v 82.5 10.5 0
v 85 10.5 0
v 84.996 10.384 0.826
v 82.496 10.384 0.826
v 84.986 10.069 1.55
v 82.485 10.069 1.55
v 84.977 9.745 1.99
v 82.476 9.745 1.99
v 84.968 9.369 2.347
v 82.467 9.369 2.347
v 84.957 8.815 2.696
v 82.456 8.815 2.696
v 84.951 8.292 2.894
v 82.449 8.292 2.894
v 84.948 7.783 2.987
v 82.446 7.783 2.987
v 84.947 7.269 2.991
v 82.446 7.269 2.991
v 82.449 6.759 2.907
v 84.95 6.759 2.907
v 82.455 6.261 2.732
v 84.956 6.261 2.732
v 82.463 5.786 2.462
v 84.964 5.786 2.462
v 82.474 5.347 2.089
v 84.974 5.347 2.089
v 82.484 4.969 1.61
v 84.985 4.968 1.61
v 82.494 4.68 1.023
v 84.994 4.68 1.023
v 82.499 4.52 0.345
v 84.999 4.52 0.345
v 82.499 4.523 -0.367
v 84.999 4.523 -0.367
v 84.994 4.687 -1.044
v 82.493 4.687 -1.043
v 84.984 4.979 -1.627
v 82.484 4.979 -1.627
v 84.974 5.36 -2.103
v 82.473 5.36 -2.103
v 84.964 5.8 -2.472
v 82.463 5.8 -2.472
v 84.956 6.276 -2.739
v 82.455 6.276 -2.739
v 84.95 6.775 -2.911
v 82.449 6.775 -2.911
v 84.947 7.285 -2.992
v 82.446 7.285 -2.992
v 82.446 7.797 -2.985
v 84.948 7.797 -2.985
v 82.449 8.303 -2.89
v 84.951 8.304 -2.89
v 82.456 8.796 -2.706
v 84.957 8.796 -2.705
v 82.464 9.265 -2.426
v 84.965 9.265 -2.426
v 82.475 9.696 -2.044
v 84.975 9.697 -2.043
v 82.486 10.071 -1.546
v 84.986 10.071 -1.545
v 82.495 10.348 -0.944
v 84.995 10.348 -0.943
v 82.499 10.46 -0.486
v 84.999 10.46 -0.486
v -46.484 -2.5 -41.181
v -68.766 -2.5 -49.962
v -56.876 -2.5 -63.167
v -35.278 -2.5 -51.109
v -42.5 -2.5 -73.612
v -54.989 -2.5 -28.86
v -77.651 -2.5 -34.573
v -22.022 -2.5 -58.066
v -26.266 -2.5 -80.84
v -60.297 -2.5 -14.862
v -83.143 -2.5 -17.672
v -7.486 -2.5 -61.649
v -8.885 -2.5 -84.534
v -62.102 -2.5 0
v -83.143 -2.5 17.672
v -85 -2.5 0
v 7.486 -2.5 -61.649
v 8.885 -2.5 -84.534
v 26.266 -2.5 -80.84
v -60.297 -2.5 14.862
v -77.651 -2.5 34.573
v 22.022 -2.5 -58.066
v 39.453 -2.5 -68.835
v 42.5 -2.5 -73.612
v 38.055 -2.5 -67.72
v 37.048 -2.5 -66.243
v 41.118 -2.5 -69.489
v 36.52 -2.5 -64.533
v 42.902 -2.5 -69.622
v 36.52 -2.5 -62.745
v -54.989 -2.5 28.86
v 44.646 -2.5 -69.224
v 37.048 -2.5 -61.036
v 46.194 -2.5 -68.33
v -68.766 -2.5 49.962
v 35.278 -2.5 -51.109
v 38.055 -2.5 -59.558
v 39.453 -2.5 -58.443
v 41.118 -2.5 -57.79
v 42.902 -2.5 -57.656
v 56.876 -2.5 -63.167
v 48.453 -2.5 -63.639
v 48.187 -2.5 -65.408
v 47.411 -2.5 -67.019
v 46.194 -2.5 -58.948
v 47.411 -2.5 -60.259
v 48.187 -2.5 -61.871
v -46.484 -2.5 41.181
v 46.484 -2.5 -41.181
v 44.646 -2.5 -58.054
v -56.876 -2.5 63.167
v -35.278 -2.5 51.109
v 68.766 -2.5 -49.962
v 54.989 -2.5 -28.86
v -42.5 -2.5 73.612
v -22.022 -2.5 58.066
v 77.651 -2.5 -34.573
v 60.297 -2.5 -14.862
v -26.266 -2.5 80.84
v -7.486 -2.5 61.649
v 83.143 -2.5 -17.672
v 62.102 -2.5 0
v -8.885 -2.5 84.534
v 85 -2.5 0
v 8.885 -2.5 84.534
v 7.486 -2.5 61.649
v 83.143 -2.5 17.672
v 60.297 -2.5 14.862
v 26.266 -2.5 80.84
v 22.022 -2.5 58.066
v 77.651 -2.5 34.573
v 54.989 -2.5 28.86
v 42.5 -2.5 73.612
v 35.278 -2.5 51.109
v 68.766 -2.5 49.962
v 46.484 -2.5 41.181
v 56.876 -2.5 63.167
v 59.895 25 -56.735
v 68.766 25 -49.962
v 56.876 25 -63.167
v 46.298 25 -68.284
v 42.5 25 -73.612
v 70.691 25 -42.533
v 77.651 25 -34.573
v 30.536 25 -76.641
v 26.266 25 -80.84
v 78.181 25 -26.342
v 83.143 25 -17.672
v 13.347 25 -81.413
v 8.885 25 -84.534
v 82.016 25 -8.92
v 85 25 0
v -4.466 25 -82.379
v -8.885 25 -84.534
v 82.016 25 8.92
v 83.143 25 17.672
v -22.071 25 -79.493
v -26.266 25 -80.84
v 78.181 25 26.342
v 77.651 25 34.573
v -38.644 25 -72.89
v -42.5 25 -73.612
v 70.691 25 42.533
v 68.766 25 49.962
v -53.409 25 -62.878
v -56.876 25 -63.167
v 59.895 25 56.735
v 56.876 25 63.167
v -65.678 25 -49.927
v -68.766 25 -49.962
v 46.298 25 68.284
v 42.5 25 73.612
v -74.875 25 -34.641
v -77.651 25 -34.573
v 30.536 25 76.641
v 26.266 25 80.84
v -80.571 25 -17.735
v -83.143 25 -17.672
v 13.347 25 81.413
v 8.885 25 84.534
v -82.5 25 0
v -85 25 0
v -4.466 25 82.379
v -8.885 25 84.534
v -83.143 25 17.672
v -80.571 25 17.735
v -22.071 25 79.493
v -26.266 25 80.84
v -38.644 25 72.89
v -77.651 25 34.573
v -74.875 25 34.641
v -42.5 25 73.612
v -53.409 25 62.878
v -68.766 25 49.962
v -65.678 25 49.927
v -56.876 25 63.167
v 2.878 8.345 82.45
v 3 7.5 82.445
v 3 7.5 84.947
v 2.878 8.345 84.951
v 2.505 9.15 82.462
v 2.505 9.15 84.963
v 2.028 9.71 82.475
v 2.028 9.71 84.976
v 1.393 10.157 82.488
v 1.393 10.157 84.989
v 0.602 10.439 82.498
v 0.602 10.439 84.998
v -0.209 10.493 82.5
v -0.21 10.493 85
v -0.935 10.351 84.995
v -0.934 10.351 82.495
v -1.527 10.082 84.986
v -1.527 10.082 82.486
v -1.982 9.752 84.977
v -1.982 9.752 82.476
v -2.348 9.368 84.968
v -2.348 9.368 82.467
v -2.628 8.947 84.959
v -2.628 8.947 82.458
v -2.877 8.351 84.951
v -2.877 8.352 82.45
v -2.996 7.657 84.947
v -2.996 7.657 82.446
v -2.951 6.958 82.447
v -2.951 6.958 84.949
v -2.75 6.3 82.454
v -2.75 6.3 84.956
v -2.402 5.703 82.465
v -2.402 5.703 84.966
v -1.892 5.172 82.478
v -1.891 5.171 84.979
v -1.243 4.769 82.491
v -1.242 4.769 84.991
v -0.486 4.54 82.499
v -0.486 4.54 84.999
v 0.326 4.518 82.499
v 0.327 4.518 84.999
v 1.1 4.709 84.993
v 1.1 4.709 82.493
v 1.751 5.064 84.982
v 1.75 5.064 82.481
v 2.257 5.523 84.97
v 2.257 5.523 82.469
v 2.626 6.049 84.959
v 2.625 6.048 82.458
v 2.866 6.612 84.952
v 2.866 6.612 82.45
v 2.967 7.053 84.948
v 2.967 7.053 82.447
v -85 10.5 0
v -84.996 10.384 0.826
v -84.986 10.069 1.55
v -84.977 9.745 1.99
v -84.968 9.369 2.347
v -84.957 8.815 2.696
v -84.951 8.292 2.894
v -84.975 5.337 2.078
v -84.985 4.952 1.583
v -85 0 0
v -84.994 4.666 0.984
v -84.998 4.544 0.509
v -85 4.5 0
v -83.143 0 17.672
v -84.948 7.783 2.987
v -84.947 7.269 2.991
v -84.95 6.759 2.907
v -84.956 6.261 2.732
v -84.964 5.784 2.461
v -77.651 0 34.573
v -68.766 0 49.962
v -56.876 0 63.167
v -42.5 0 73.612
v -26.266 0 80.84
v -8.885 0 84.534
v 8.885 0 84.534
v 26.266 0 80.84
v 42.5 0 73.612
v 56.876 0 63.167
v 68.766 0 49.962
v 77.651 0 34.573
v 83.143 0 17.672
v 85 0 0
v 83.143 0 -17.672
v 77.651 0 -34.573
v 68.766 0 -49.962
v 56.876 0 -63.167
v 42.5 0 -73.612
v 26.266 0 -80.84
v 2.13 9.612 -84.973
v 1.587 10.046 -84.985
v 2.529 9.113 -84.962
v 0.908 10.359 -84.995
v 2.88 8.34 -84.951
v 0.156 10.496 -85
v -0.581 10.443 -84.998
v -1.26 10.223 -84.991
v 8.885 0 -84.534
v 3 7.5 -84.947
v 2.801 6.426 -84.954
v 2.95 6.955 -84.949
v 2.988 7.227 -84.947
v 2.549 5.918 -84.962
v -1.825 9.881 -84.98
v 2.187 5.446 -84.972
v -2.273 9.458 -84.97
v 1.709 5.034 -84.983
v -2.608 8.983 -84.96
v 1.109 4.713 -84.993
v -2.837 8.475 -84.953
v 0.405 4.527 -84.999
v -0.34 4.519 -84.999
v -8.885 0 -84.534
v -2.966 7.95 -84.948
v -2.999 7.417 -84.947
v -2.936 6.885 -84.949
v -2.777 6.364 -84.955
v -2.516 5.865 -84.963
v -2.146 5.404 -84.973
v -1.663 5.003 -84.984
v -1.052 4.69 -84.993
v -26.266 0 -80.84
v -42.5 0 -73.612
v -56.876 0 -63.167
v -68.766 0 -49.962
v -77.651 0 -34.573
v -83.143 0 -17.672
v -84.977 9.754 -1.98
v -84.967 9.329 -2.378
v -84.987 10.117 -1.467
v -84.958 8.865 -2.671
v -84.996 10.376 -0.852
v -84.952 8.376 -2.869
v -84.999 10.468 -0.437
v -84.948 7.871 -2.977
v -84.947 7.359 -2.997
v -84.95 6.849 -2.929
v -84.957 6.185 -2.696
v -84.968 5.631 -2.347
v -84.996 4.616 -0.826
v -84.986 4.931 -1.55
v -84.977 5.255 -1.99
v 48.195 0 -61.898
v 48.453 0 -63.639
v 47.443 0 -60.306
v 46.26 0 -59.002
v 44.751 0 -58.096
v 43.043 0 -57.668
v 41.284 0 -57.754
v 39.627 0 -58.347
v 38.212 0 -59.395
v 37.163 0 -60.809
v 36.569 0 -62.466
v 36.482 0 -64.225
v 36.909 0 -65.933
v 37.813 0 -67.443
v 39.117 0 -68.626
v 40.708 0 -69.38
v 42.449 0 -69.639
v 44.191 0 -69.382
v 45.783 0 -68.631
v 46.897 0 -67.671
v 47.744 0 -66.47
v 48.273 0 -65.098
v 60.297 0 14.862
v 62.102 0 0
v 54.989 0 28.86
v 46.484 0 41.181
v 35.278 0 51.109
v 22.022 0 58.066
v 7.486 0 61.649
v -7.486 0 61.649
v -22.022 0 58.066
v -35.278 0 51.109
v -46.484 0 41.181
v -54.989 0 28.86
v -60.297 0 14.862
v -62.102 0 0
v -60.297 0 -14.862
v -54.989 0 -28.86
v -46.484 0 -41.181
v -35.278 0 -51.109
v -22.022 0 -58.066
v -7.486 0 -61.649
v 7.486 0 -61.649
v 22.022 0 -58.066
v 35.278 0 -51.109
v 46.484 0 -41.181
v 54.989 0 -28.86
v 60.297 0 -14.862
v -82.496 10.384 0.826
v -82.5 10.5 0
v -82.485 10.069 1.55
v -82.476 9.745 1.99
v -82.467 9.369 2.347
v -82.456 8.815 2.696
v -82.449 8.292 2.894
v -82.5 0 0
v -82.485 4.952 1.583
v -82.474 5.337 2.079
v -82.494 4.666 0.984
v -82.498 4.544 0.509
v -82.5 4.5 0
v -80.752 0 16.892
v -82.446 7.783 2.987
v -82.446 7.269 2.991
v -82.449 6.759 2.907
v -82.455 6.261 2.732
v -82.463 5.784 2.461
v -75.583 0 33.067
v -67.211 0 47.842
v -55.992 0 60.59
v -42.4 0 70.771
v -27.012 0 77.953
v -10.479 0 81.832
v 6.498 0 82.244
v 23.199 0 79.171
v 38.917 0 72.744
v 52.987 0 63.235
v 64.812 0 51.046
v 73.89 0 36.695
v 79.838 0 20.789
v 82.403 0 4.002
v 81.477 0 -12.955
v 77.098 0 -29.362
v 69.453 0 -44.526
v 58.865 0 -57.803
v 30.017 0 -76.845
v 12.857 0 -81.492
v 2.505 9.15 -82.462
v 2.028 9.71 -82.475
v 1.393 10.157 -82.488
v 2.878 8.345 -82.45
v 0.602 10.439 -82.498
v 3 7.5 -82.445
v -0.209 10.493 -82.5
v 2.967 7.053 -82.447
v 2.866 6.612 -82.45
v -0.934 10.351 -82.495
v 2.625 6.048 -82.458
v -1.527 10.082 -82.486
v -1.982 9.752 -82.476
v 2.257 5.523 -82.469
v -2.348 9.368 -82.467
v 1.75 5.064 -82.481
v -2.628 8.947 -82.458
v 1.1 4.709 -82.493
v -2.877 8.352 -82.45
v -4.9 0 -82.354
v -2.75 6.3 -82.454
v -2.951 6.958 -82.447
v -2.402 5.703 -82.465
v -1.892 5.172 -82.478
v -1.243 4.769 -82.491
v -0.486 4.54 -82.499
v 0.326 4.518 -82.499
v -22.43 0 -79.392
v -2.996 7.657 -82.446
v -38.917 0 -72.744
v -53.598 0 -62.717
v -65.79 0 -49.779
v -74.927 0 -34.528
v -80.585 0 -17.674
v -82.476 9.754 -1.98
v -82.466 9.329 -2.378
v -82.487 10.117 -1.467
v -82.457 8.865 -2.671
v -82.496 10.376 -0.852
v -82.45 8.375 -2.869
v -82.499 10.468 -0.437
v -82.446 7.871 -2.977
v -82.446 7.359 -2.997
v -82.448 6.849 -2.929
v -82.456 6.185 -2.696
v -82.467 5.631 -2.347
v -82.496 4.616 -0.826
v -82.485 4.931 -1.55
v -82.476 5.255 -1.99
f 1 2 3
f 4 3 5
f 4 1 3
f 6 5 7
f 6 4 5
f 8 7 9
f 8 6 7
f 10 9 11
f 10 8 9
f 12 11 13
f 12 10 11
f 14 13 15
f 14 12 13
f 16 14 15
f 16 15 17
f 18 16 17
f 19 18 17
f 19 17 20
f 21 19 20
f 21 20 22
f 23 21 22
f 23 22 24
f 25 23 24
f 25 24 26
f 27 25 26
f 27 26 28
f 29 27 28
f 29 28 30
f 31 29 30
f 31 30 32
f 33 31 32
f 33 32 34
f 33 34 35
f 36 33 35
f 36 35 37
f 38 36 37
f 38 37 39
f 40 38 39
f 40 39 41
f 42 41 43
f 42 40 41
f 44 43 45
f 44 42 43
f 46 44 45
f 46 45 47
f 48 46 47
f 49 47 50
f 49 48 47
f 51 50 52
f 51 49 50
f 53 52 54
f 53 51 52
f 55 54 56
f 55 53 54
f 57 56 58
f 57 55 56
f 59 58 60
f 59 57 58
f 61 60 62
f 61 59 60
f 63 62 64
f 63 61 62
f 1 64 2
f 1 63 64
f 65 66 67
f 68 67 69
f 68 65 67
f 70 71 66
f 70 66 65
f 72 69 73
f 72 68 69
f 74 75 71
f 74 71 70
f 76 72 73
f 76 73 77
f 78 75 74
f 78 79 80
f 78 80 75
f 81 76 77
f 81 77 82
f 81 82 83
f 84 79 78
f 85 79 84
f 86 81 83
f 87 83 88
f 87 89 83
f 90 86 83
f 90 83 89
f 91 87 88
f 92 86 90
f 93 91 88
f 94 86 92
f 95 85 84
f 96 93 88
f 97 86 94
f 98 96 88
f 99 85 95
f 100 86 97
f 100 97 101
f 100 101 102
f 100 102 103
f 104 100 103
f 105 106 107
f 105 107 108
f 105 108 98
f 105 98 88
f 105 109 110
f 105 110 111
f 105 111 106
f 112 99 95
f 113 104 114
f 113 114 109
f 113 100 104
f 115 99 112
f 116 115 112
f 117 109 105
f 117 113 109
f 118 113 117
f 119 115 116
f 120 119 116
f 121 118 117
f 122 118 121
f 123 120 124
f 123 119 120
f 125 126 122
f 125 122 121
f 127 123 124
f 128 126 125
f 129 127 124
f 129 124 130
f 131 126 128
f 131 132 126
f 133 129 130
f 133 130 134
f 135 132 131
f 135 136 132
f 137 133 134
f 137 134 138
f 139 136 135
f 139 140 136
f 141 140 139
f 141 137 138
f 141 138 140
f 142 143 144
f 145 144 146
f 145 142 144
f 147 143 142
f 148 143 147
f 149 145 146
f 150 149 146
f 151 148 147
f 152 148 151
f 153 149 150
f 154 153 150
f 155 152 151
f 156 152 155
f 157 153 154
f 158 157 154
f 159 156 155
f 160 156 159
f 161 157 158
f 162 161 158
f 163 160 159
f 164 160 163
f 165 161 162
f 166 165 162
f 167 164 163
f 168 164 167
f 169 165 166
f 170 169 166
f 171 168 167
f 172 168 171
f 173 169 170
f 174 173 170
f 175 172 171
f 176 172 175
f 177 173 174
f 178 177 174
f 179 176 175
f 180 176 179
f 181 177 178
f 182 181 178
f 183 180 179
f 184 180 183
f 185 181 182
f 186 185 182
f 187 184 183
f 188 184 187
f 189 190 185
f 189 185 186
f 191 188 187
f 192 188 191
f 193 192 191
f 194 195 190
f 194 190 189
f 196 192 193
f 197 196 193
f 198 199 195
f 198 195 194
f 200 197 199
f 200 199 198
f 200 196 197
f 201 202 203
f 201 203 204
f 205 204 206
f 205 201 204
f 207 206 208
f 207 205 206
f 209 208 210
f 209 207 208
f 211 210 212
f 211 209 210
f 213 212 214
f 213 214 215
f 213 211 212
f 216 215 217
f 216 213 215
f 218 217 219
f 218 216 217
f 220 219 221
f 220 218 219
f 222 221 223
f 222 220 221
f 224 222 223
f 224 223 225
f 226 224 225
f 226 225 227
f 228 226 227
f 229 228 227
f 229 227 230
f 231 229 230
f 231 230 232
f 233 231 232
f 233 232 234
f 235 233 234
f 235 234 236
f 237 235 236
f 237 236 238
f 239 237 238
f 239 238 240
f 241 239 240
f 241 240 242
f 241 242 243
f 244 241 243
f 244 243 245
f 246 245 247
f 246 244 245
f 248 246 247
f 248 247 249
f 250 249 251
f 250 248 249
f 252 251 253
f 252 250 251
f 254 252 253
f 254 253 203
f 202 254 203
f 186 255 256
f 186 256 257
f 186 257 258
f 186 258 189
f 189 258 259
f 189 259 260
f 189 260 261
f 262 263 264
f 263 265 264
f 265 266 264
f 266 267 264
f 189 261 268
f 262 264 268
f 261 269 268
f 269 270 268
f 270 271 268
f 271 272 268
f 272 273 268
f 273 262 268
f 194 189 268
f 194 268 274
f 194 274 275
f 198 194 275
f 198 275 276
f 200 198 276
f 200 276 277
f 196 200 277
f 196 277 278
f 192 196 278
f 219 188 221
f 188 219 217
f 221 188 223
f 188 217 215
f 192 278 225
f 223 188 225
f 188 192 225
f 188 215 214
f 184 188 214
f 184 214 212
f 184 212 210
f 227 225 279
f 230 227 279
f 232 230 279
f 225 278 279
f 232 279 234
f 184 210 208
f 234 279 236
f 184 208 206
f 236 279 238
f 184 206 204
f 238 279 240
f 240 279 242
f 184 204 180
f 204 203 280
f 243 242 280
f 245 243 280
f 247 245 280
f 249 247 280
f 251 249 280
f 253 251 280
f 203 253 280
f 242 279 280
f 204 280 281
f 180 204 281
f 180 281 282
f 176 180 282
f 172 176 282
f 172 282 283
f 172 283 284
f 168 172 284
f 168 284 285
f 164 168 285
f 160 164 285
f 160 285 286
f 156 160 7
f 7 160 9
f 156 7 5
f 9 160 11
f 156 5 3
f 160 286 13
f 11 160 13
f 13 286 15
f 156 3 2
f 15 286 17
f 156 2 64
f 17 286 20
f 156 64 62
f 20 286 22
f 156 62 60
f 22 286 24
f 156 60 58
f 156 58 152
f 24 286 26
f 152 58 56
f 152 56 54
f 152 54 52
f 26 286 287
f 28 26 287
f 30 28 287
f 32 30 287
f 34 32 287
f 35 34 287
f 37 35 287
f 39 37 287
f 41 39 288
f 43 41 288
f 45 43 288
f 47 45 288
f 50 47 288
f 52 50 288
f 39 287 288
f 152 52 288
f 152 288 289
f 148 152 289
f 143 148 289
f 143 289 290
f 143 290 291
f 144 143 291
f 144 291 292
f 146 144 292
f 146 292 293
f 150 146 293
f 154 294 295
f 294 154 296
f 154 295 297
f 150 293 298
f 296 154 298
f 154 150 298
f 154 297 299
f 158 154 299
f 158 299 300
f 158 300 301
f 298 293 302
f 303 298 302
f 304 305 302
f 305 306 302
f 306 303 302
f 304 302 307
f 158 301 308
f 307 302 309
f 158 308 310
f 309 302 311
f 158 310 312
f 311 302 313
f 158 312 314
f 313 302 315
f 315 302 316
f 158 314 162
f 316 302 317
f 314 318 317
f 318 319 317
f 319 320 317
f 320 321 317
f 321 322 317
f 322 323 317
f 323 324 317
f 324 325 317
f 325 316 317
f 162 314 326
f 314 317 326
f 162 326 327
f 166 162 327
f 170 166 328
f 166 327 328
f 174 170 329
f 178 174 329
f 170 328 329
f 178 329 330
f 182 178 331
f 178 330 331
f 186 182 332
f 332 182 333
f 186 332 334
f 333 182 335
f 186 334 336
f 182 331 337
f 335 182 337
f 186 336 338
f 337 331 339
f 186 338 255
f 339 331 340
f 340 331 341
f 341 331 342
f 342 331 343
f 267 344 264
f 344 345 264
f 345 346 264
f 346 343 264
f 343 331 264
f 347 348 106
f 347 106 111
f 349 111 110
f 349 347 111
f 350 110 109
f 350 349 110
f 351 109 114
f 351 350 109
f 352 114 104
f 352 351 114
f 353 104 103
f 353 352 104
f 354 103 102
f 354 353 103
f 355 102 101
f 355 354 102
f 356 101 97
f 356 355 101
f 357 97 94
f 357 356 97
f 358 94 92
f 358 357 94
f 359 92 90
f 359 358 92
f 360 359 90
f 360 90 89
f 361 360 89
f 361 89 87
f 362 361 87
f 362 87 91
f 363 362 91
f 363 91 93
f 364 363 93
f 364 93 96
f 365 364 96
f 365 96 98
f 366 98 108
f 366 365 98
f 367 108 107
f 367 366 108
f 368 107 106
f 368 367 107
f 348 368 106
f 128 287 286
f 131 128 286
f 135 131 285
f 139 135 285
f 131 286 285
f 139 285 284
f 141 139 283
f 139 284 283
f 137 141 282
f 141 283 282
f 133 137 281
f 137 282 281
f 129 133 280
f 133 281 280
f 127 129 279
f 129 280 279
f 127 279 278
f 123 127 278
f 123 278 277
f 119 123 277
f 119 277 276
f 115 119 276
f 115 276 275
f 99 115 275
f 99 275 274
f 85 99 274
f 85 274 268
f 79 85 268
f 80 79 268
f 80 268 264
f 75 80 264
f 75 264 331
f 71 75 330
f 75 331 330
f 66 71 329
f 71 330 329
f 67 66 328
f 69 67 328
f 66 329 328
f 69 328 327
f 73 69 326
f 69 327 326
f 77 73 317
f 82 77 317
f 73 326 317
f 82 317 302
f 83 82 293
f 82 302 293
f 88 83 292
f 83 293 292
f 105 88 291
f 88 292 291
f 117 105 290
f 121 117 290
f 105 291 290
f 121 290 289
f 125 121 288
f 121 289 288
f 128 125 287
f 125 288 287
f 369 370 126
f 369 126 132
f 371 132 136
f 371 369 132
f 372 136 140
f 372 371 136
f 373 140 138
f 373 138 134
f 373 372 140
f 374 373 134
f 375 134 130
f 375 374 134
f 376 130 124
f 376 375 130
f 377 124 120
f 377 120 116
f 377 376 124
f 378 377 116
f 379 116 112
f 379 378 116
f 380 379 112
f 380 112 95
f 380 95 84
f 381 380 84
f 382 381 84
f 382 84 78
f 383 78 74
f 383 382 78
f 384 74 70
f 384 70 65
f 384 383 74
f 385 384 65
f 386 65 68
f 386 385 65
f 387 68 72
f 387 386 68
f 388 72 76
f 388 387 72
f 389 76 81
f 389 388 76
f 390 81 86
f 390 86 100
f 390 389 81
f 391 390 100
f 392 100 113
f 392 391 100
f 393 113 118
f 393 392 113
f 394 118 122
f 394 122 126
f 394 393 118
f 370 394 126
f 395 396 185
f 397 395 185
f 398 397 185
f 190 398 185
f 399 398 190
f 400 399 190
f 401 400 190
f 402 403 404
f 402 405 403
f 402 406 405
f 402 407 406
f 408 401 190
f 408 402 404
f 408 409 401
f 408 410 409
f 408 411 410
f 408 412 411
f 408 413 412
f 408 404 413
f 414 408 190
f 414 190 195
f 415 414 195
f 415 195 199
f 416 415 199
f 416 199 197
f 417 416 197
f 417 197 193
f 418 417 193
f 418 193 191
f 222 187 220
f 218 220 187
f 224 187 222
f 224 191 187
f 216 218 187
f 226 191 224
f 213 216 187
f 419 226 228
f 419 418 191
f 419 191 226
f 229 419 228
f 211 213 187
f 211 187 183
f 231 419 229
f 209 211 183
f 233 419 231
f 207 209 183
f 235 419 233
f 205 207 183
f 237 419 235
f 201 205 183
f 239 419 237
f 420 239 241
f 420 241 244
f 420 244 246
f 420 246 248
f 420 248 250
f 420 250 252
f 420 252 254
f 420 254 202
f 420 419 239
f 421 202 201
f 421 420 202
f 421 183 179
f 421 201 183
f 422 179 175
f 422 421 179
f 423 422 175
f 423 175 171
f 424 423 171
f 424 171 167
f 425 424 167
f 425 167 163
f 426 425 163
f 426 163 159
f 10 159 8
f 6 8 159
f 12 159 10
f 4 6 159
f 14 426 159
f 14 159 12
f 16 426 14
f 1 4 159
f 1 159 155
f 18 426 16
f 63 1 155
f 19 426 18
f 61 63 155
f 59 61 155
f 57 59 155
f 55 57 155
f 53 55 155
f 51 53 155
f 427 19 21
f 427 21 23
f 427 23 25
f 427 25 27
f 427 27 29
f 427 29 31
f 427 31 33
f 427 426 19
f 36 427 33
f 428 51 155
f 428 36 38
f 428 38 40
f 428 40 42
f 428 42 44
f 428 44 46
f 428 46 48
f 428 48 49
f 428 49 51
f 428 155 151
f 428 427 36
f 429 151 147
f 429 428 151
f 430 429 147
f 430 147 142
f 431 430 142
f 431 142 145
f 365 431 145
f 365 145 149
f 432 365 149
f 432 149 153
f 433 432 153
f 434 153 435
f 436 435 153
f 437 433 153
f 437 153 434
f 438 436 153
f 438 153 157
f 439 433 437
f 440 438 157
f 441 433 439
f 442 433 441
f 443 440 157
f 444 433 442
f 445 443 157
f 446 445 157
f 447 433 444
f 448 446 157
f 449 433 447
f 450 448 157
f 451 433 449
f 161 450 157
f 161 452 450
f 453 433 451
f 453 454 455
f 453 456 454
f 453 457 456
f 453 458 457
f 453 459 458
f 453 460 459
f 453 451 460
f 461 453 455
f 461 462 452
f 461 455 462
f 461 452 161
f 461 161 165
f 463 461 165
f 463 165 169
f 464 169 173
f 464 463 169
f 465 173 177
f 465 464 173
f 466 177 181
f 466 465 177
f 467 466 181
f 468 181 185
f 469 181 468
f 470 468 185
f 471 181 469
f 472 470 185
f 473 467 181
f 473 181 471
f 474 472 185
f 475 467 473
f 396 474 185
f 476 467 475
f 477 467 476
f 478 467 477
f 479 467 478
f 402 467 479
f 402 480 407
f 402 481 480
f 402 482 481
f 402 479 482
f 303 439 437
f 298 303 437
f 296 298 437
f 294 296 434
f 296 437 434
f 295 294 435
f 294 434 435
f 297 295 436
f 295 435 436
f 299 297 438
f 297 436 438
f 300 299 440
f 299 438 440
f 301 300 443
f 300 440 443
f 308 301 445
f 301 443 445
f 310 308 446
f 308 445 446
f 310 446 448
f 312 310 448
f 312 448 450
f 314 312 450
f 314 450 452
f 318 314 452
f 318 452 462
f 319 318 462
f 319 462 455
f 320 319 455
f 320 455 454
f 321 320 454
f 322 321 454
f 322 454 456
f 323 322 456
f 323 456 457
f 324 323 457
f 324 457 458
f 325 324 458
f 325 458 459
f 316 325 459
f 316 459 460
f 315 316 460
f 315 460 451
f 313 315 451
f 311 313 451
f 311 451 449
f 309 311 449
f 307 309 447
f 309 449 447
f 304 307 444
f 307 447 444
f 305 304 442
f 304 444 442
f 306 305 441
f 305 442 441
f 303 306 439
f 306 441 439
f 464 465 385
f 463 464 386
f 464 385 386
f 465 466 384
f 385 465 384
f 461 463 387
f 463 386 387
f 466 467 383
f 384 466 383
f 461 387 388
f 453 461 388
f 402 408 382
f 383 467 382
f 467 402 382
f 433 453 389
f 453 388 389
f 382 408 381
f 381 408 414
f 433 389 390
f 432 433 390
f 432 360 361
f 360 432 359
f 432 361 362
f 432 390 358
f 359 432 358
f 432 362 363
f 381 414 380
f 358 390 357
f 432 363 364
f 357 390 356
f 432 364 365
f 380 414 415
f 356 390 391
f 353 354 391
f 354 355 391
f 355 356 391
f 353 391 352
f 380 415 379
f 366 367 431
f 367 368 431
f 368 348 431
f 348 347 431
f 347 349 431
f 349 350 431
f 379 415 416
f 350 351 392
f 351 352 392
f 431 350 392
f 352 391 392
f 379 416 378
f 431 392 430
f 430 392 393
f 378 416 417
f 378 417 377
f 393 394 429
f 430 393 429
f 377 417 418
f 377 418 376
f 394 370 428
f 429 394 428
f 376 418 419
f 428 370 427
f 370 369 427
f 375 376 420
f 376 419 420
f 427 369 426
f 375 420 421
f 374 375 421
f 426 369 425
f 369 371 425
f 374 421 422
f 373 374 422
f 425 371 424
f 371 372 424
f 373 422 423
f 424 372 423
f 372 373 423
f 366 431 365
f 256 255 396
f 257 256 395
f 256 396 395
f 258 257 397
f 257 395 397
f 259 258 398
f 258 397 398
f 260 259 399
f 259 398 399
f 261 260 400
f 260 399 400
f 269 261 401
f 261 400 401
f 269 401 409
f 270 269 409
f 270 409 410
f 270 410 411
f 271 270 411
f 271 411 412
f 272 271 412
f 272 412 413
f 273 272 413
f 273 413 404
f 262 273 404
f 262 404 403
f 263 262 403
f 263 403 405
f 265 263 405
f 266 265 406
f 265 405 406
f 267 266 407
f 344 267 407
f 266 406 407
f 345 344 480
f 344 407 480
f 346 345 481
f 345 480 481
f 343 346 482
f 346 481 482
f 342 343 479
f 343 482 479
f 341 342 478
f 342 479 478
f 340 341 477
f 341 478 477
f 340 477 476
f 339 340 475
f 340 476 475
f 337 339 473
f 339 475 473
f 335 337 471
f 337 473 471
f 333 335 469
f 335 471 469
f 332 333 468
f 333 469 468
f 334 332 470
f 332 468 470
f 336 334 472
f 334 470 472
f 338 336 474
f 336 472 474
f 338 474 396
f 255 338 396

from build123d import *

# Parameters (mm, degrees)
F0_R          = 85
F0_R_2        = 62.1020092735
F1_DEPTH      = 2.5
F2_R          = 85
F2_R_2        = 82.5
F3_DEPTH      = 25
F4_R          = 3
F5_DEPTH      = 85.001
F5_DEPTH_BACK = 85.001
F6_R          = 3
F7_DEPTH      = 85.0010001
F7_DEPTH_BACK = 85.0010001
F8_R          = 6
F9_DEPTH      = 25


with BuildPart() as f1:
    # F0 (on Front) → F1 (new body)
    with BuildSketch(Plane.XZ):
        Circle(F0_R)
        Circle(F0_R_2, mode=Mode.SUBTRACT)
    extrude(amount=F1_DEPTH)

    # F2 (on face) → F3 (join)
    with BuildSketch(Plane(origin=(0, 0, 0), x_dir=(-1, 0, 0), z_dir=(0, 1, 0))):
        Circle(F2_R)
        Circle(F2_R_2, mode=Mode.SUBTRACT)
    extrude(amount=F3_DEPTH)

    # F4 (on Top) → F5 (cut, two sides)
    with BuildSketch(Plane.XY) as f5_sk:
        with Locations((0, 7.5)):
            Circle(F4_R)
    extrude(amount=-F5_DEPTH, mode=Mode.SUBTRACT)
    extrude(f5_sk.sketch, amount=F5_DEPTH_BACK, mode=Mode.SUBTRACT)

    # F6 (on Right) → F7 (cut, two sides)
    with BuildSketch(Plane.YZ) as f7_sk:
        with Locations((7.5, 0)):
            Circle(F6_R)
    extrude(amount=F7_DEPTH, mode=Mode.SUBTRACT)
    extrude(f7_sk.sketch, amount=-F7_DEPTH_BACK, mode=Mode.SUBTRACT)

    # F8 (on Front) → F9 (cut)
    with BuildSketch(Plane.XZ):
        with Locations((42.4534804545, -63.6392331608)):
            Circle(F8_R)
    extrude(amount=F9_DEPTH, mode=Mode.SUBTRACT)


solid = f1.part
